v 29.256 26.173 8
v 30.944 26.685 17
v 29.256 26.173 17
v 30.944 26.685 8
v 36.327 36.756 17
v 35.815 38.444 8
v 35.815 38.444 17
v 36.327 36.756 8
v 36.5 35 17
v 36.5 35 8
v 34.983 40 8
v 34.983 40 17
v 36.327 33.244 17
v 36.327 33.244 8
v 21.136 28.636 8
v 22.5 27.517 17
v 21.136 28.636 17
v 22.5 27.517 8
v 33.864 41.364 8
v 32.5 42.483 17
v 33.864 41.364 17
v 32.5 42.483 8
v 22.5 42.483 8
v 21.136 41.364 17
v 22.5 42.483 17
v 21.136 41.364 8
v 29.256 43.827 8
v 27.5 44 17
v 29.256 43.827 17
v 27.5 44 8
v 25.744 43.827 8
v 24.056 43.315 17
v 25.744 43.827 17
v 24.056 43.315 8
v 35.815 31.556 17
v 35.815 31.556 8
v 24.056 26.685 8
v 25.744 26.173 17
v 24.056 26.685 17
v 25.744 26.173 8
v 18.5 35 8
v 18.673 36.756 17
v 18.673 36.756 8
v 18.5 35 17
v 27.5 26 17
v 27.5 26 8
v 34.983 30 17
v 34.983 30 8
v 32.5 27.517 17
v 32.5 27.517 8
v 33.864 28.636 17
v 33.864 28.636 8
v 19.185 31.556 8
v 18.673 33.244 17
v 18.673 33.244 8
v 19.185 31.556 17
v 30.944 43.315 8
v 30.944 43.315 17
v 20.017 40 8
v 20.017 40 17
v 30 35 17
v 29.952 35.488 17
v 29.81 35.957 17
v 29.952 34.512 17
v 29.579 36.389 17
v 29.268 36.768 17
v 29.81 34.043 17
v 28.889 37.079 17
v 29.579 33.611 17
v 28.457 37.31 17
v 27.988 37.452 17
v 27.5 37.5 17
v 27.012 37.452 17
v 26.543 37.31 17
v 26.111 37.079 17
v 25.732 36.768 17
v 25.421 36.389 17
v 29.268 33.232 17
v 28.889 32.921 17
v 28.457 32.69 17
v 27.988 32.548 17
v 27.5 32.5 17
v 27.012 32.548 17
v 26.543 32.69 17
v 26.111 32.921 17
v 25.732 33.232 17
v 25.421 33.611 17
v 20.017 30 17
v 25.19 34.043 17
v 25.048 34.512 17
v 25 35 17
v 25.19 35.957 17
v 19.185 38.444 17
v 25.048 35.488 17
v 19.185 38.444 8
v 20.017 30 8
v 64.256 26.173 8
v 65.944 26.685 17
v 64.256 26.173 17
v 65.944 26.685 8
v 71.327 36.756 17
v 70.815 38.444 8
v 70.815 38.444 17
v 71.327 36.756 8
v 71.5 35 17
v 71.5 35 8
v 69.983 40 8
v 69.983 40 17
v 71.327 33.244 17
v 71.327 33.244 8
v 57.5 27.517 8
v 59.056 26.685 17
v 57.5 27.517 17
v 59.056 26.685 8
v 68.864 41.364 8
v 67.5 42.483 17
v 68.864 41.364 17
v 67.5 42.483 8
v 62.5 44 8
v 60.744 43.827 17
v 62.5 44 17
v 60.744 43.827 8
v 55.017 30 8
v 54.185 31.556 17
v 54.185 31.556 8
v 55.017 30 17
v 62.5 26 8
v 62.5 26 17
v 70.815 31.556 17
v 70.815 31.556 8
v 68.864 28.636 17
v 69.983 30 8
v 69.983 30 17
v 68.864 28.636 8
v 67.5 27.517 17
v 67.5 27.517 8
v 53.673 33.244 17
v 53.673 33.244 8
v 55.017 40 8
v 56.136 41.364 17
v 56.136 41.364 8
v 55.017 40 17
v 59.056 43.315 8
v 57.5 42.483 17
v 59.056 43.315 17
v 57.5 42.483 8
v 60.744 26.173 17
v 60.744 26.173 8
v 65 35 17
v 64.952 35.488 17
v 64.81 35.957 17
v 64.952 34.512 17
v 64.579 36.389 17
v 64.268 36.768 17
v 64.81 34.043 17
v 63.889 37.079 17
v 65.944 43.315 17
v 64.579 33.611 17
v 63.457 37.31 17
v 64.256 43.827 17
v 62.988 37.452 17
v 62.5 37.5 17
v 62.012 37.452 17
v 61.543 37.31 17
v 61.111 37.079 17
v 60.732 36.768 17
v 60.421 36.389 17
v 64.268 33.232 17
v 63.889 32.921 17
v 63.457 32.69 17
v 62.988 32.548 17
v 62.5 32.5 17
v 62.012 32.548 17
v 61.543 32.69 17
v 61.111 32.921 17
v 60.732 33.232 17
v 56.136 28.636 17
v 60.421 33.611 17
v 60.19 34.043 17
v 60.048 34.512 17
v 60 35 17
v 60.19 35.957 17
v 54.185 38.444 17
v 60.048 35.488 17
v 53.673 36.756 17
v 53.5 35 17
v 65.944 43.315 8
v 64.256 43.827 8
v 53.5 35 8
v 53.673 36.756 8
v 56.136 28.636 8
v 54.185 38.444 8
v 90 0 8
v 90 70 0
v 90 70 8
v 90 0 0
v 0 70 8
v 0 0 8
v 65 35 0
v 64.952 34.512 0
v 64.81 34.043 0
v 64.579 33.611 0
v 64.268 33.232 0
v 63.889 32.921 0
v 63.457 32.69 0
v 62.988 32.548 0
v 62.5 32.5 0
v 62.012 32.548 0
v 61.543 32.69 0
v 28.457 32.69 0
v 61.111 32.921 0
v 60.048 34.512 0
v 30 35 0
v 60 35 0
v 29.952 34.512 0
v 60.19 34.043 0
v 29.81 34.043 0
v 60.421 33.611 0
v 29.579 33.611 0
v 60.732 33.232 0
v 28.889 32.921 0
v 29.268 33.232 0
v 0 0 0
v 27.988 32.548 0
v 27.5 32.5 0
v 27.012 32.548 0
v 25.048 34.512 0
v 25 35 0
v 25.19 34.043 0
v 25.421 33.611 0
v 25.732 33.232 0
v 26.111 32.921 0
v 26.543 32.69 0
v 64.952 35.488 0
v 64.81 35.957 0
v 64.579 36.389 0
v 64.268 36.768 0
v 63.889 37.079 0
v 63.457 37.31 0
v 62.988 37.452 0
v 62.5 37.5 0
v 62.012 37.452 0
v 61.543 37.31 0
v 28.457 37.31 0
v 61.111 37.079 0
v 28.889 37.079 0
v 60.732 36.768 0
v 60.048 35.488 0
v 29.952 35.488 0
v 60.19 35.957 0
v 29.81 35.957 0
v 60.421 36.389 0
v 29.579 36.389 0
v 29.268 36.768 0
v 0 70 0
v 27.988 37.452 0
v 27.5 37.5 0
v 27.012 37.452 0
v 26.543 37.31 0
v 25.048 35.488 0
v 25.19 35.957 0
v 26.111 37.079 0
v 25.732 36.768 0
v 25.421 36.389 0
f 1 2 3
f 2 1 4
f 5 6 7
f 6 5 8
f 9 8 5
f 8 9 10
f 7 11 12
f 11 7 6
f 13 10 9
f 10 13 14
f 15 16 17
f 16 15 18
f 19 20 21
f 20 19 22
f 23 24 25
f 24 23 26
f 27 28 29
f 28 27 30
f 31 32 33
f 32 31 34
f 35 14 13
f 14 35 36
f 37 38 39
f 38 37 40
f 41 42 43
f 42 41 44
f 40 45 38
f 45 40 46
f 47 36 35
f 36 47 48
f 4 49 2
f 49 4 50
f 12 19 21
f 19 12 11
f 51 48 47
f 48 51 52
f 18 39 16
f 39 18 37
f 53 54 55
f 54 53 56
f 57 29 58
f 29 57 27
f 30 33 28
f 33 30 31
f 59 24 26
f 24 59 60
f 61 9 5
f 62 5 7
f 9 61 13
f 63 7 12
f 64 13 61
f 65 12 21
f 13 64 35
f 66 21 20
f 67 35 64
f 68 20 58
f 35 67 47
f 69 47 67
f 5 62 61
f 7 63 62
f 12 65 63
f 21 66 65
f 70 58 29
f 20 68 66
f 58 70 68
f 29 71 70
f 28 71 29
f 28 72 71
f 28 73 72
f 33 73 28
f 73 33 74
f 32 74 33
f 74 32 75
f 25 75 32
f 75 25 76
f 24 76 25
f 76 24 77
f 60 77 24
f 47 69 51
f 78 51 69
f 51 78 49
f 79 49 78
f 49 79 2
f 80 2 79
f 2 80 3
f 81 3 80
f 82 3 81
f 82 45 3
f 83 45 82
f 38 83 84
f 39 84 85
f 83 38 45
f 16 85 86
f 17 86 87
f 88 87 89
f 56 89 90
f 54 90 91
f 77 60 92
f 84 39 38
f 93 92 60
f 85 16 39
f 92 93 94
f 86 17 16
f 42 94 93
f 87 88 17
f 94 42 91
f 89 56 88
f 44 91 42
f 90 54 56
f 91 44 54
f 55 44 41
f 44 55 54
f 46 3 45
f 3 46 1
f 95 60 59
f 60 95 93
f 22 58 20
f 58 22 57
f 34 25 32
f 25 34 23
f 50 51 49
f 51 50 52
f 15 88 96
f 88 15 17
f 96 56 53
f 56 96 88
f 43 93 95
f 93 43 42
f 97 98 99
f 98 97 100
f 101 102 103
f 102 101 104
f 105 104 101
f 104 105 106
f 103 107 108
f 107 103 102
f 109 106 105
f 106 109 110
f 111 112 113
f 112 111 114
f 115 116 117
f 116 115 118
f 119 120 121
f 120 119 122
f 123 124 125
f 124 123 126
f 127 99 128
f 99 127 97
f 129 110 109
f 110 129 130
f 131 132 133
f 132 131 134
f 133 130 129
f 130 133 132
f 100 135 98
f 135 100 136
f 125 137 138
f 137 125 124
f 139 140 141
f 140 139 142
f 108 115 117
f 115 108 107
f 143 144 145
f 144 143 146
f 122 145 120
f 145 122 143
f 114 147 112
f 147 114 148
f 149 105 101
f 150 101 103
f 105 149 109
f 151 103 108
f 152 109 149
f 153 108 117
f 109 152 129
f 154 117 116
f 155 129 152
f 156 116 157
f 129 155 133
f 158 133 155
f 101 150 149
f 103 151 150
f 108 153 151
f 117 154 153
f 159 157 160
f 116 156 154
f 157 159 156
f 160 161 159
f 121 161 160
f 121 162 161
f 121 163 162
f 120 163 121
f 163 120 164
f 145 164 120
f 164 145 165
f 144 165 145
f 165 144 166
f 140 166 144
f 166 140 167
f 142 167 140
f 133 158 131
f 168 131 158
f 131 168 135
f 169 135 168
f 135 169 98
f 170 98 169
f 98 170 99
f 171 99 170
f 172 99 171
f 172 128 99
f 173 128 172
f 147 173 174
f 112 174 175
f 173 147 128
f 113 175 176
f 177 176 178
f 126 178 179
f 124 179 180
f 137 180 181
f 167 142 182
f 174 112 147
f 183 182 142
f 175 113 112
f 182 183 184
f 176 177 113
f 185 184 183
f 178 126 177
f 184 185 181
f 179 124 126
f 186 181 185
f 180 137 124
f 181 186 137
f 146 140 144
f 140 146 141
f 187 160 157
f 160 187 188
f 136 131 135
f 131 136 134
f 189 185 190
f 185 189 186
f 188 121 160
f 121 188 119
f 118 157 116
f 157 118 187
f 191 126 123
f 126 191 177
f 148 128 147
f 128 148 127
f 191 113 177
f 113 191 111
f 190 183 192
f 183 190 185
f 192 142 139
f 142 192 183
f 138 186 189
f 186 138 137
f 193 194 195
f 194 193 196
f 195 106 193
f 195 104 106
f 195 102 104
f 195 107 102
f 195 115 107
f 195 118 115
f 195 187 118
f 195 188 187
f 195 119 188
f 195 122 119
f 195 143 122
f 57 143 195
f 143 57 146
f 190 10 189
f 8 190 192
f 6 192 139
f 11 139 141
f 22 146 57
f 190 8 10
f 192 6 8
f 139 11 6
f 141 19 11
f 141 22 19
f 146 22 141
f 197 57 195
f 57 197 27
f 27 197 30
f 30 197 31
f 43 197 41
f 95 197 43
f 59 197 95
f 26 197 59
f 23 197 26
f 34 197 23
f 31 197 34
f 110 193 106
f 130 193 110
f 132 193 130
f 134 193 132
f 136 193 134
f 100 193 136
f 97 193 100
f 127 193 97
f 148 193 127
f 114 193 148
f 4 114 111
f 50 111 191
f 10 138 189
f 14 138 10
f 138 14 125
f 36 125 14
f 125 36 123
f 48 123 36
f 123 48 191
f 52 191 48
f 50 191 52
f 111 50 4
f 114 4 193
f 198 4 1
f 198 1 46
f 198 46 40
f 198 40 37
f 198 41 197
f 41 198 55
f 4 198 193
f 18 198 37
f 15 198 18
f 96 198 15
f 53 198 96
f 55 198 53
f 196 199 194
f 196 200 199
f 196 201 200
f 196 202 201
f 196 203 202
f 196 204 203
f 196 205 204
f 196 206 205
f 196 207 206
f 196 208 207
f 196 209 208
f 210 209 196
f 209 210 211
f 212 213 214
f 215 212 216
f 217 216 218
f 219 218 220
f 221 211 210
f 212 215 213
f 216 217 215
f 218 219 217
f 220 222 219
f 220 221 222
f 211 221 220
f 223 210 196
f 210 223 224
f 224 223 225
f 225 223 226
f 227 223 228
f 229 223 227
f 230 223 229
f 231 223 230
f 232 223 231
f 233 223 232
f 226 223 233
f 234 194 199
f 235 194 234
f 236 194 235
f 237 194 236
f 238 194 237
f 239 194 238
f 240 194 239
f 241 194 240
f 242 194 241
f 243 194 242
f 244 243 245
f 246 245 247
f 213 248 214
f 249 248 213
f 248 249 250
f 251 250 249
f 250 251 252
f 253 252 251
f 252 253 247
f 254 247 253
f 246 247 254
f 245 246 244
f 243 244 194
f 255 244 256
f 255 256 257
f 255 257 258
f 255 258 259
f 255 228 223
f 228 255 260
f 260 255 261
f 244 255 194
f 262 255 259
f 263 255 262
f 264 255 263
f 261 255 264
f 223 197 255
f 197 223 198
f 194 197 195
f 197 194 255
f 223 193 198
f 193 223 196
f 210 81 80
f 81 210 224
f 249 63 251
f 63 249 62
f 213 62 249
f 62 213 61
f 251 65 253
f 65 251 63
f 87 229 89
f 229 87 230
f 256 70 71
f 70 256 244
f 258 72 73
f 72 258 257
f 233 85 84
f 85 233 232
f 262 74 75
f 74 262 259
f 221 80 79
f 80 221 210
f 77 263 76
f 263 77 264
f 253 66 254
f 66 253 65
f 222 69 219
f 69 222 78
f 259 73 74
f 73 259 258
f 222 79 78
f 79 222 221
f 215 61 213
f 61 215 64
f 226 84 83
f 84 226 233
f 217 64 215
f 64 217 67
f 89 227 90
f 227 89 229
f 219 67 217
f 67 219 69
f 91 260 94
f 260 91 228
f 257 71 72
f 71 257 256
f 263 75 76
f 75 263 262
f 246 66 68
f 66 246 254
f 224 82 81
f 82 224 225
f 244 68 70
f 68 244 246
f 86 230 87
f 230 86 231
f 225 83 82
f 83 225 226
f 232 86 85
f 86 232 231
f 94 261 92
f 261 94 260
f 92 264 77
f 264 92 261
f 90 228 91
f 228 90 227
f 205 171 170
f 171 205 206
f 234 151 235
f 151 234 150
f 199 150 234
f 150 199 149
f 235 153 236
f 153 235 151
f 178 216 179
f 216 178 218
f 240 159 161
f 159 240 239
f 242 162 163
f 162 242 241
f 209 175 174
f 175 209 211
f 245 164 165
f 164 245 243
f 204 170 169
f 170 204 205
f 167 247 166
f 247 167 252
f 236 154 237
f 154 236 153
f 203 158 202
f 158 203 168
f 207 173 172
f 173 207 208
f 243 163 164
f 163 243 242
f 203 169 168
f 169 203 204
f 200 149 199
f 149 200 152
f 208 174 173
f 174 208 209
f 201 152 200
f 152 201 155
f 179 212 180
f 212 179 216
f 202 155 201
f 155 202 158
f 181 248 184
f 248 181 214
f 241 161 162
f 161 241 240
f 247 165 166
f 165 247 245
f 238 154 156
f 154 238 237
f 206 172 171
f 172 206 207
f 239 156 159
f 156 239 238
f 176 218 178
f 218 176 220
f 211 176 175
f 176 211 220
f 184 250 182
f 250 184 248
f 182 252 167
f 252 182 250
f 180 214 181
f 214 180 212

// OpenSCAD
$fn = 32;

// ----------------------------------------------------------------------
// Drill jig: two_boss jig
// ----------------------------------------------------------------------

// --- parameters (mm) ---
plate_l = 90;             // plate length, X
plate_w = 70;             // plate width, Y
plate_t = 8;              // plate thickness
boss_d = 18;              // guide boss diameter
boss_h = 10;              // boss height above the plate
guide_d = 5;              // guide hole diameter
boss_pitch = 35;          // boss pitch

n_boss = 2;  // guide bosses
boss_x0 = (plate_l - (n_boss - 1) * boss_pitch) / 2;  // first boss X
boss_top = plate_t - 1 + boss_h;  // boss crown height
total_h = boss_top;  // overall height

difference() {
  union() {
  cube([plate_l, plate_w, plate_t]);
  for (i = [0 : n_boss - 1])
    translate([boss_x0 + i * boss_pitch, plate_w / 2, plate_t - 1])
      cylinder(h = boss_h, d = boss_d);
  }
  for (i = [0 : n_boss - 1])
    translate([boss_x0 + i * boss_pitch, plate_w / 2, -1])
      cylinder(h = plate_t + boss_h, d = guide_d);
}
